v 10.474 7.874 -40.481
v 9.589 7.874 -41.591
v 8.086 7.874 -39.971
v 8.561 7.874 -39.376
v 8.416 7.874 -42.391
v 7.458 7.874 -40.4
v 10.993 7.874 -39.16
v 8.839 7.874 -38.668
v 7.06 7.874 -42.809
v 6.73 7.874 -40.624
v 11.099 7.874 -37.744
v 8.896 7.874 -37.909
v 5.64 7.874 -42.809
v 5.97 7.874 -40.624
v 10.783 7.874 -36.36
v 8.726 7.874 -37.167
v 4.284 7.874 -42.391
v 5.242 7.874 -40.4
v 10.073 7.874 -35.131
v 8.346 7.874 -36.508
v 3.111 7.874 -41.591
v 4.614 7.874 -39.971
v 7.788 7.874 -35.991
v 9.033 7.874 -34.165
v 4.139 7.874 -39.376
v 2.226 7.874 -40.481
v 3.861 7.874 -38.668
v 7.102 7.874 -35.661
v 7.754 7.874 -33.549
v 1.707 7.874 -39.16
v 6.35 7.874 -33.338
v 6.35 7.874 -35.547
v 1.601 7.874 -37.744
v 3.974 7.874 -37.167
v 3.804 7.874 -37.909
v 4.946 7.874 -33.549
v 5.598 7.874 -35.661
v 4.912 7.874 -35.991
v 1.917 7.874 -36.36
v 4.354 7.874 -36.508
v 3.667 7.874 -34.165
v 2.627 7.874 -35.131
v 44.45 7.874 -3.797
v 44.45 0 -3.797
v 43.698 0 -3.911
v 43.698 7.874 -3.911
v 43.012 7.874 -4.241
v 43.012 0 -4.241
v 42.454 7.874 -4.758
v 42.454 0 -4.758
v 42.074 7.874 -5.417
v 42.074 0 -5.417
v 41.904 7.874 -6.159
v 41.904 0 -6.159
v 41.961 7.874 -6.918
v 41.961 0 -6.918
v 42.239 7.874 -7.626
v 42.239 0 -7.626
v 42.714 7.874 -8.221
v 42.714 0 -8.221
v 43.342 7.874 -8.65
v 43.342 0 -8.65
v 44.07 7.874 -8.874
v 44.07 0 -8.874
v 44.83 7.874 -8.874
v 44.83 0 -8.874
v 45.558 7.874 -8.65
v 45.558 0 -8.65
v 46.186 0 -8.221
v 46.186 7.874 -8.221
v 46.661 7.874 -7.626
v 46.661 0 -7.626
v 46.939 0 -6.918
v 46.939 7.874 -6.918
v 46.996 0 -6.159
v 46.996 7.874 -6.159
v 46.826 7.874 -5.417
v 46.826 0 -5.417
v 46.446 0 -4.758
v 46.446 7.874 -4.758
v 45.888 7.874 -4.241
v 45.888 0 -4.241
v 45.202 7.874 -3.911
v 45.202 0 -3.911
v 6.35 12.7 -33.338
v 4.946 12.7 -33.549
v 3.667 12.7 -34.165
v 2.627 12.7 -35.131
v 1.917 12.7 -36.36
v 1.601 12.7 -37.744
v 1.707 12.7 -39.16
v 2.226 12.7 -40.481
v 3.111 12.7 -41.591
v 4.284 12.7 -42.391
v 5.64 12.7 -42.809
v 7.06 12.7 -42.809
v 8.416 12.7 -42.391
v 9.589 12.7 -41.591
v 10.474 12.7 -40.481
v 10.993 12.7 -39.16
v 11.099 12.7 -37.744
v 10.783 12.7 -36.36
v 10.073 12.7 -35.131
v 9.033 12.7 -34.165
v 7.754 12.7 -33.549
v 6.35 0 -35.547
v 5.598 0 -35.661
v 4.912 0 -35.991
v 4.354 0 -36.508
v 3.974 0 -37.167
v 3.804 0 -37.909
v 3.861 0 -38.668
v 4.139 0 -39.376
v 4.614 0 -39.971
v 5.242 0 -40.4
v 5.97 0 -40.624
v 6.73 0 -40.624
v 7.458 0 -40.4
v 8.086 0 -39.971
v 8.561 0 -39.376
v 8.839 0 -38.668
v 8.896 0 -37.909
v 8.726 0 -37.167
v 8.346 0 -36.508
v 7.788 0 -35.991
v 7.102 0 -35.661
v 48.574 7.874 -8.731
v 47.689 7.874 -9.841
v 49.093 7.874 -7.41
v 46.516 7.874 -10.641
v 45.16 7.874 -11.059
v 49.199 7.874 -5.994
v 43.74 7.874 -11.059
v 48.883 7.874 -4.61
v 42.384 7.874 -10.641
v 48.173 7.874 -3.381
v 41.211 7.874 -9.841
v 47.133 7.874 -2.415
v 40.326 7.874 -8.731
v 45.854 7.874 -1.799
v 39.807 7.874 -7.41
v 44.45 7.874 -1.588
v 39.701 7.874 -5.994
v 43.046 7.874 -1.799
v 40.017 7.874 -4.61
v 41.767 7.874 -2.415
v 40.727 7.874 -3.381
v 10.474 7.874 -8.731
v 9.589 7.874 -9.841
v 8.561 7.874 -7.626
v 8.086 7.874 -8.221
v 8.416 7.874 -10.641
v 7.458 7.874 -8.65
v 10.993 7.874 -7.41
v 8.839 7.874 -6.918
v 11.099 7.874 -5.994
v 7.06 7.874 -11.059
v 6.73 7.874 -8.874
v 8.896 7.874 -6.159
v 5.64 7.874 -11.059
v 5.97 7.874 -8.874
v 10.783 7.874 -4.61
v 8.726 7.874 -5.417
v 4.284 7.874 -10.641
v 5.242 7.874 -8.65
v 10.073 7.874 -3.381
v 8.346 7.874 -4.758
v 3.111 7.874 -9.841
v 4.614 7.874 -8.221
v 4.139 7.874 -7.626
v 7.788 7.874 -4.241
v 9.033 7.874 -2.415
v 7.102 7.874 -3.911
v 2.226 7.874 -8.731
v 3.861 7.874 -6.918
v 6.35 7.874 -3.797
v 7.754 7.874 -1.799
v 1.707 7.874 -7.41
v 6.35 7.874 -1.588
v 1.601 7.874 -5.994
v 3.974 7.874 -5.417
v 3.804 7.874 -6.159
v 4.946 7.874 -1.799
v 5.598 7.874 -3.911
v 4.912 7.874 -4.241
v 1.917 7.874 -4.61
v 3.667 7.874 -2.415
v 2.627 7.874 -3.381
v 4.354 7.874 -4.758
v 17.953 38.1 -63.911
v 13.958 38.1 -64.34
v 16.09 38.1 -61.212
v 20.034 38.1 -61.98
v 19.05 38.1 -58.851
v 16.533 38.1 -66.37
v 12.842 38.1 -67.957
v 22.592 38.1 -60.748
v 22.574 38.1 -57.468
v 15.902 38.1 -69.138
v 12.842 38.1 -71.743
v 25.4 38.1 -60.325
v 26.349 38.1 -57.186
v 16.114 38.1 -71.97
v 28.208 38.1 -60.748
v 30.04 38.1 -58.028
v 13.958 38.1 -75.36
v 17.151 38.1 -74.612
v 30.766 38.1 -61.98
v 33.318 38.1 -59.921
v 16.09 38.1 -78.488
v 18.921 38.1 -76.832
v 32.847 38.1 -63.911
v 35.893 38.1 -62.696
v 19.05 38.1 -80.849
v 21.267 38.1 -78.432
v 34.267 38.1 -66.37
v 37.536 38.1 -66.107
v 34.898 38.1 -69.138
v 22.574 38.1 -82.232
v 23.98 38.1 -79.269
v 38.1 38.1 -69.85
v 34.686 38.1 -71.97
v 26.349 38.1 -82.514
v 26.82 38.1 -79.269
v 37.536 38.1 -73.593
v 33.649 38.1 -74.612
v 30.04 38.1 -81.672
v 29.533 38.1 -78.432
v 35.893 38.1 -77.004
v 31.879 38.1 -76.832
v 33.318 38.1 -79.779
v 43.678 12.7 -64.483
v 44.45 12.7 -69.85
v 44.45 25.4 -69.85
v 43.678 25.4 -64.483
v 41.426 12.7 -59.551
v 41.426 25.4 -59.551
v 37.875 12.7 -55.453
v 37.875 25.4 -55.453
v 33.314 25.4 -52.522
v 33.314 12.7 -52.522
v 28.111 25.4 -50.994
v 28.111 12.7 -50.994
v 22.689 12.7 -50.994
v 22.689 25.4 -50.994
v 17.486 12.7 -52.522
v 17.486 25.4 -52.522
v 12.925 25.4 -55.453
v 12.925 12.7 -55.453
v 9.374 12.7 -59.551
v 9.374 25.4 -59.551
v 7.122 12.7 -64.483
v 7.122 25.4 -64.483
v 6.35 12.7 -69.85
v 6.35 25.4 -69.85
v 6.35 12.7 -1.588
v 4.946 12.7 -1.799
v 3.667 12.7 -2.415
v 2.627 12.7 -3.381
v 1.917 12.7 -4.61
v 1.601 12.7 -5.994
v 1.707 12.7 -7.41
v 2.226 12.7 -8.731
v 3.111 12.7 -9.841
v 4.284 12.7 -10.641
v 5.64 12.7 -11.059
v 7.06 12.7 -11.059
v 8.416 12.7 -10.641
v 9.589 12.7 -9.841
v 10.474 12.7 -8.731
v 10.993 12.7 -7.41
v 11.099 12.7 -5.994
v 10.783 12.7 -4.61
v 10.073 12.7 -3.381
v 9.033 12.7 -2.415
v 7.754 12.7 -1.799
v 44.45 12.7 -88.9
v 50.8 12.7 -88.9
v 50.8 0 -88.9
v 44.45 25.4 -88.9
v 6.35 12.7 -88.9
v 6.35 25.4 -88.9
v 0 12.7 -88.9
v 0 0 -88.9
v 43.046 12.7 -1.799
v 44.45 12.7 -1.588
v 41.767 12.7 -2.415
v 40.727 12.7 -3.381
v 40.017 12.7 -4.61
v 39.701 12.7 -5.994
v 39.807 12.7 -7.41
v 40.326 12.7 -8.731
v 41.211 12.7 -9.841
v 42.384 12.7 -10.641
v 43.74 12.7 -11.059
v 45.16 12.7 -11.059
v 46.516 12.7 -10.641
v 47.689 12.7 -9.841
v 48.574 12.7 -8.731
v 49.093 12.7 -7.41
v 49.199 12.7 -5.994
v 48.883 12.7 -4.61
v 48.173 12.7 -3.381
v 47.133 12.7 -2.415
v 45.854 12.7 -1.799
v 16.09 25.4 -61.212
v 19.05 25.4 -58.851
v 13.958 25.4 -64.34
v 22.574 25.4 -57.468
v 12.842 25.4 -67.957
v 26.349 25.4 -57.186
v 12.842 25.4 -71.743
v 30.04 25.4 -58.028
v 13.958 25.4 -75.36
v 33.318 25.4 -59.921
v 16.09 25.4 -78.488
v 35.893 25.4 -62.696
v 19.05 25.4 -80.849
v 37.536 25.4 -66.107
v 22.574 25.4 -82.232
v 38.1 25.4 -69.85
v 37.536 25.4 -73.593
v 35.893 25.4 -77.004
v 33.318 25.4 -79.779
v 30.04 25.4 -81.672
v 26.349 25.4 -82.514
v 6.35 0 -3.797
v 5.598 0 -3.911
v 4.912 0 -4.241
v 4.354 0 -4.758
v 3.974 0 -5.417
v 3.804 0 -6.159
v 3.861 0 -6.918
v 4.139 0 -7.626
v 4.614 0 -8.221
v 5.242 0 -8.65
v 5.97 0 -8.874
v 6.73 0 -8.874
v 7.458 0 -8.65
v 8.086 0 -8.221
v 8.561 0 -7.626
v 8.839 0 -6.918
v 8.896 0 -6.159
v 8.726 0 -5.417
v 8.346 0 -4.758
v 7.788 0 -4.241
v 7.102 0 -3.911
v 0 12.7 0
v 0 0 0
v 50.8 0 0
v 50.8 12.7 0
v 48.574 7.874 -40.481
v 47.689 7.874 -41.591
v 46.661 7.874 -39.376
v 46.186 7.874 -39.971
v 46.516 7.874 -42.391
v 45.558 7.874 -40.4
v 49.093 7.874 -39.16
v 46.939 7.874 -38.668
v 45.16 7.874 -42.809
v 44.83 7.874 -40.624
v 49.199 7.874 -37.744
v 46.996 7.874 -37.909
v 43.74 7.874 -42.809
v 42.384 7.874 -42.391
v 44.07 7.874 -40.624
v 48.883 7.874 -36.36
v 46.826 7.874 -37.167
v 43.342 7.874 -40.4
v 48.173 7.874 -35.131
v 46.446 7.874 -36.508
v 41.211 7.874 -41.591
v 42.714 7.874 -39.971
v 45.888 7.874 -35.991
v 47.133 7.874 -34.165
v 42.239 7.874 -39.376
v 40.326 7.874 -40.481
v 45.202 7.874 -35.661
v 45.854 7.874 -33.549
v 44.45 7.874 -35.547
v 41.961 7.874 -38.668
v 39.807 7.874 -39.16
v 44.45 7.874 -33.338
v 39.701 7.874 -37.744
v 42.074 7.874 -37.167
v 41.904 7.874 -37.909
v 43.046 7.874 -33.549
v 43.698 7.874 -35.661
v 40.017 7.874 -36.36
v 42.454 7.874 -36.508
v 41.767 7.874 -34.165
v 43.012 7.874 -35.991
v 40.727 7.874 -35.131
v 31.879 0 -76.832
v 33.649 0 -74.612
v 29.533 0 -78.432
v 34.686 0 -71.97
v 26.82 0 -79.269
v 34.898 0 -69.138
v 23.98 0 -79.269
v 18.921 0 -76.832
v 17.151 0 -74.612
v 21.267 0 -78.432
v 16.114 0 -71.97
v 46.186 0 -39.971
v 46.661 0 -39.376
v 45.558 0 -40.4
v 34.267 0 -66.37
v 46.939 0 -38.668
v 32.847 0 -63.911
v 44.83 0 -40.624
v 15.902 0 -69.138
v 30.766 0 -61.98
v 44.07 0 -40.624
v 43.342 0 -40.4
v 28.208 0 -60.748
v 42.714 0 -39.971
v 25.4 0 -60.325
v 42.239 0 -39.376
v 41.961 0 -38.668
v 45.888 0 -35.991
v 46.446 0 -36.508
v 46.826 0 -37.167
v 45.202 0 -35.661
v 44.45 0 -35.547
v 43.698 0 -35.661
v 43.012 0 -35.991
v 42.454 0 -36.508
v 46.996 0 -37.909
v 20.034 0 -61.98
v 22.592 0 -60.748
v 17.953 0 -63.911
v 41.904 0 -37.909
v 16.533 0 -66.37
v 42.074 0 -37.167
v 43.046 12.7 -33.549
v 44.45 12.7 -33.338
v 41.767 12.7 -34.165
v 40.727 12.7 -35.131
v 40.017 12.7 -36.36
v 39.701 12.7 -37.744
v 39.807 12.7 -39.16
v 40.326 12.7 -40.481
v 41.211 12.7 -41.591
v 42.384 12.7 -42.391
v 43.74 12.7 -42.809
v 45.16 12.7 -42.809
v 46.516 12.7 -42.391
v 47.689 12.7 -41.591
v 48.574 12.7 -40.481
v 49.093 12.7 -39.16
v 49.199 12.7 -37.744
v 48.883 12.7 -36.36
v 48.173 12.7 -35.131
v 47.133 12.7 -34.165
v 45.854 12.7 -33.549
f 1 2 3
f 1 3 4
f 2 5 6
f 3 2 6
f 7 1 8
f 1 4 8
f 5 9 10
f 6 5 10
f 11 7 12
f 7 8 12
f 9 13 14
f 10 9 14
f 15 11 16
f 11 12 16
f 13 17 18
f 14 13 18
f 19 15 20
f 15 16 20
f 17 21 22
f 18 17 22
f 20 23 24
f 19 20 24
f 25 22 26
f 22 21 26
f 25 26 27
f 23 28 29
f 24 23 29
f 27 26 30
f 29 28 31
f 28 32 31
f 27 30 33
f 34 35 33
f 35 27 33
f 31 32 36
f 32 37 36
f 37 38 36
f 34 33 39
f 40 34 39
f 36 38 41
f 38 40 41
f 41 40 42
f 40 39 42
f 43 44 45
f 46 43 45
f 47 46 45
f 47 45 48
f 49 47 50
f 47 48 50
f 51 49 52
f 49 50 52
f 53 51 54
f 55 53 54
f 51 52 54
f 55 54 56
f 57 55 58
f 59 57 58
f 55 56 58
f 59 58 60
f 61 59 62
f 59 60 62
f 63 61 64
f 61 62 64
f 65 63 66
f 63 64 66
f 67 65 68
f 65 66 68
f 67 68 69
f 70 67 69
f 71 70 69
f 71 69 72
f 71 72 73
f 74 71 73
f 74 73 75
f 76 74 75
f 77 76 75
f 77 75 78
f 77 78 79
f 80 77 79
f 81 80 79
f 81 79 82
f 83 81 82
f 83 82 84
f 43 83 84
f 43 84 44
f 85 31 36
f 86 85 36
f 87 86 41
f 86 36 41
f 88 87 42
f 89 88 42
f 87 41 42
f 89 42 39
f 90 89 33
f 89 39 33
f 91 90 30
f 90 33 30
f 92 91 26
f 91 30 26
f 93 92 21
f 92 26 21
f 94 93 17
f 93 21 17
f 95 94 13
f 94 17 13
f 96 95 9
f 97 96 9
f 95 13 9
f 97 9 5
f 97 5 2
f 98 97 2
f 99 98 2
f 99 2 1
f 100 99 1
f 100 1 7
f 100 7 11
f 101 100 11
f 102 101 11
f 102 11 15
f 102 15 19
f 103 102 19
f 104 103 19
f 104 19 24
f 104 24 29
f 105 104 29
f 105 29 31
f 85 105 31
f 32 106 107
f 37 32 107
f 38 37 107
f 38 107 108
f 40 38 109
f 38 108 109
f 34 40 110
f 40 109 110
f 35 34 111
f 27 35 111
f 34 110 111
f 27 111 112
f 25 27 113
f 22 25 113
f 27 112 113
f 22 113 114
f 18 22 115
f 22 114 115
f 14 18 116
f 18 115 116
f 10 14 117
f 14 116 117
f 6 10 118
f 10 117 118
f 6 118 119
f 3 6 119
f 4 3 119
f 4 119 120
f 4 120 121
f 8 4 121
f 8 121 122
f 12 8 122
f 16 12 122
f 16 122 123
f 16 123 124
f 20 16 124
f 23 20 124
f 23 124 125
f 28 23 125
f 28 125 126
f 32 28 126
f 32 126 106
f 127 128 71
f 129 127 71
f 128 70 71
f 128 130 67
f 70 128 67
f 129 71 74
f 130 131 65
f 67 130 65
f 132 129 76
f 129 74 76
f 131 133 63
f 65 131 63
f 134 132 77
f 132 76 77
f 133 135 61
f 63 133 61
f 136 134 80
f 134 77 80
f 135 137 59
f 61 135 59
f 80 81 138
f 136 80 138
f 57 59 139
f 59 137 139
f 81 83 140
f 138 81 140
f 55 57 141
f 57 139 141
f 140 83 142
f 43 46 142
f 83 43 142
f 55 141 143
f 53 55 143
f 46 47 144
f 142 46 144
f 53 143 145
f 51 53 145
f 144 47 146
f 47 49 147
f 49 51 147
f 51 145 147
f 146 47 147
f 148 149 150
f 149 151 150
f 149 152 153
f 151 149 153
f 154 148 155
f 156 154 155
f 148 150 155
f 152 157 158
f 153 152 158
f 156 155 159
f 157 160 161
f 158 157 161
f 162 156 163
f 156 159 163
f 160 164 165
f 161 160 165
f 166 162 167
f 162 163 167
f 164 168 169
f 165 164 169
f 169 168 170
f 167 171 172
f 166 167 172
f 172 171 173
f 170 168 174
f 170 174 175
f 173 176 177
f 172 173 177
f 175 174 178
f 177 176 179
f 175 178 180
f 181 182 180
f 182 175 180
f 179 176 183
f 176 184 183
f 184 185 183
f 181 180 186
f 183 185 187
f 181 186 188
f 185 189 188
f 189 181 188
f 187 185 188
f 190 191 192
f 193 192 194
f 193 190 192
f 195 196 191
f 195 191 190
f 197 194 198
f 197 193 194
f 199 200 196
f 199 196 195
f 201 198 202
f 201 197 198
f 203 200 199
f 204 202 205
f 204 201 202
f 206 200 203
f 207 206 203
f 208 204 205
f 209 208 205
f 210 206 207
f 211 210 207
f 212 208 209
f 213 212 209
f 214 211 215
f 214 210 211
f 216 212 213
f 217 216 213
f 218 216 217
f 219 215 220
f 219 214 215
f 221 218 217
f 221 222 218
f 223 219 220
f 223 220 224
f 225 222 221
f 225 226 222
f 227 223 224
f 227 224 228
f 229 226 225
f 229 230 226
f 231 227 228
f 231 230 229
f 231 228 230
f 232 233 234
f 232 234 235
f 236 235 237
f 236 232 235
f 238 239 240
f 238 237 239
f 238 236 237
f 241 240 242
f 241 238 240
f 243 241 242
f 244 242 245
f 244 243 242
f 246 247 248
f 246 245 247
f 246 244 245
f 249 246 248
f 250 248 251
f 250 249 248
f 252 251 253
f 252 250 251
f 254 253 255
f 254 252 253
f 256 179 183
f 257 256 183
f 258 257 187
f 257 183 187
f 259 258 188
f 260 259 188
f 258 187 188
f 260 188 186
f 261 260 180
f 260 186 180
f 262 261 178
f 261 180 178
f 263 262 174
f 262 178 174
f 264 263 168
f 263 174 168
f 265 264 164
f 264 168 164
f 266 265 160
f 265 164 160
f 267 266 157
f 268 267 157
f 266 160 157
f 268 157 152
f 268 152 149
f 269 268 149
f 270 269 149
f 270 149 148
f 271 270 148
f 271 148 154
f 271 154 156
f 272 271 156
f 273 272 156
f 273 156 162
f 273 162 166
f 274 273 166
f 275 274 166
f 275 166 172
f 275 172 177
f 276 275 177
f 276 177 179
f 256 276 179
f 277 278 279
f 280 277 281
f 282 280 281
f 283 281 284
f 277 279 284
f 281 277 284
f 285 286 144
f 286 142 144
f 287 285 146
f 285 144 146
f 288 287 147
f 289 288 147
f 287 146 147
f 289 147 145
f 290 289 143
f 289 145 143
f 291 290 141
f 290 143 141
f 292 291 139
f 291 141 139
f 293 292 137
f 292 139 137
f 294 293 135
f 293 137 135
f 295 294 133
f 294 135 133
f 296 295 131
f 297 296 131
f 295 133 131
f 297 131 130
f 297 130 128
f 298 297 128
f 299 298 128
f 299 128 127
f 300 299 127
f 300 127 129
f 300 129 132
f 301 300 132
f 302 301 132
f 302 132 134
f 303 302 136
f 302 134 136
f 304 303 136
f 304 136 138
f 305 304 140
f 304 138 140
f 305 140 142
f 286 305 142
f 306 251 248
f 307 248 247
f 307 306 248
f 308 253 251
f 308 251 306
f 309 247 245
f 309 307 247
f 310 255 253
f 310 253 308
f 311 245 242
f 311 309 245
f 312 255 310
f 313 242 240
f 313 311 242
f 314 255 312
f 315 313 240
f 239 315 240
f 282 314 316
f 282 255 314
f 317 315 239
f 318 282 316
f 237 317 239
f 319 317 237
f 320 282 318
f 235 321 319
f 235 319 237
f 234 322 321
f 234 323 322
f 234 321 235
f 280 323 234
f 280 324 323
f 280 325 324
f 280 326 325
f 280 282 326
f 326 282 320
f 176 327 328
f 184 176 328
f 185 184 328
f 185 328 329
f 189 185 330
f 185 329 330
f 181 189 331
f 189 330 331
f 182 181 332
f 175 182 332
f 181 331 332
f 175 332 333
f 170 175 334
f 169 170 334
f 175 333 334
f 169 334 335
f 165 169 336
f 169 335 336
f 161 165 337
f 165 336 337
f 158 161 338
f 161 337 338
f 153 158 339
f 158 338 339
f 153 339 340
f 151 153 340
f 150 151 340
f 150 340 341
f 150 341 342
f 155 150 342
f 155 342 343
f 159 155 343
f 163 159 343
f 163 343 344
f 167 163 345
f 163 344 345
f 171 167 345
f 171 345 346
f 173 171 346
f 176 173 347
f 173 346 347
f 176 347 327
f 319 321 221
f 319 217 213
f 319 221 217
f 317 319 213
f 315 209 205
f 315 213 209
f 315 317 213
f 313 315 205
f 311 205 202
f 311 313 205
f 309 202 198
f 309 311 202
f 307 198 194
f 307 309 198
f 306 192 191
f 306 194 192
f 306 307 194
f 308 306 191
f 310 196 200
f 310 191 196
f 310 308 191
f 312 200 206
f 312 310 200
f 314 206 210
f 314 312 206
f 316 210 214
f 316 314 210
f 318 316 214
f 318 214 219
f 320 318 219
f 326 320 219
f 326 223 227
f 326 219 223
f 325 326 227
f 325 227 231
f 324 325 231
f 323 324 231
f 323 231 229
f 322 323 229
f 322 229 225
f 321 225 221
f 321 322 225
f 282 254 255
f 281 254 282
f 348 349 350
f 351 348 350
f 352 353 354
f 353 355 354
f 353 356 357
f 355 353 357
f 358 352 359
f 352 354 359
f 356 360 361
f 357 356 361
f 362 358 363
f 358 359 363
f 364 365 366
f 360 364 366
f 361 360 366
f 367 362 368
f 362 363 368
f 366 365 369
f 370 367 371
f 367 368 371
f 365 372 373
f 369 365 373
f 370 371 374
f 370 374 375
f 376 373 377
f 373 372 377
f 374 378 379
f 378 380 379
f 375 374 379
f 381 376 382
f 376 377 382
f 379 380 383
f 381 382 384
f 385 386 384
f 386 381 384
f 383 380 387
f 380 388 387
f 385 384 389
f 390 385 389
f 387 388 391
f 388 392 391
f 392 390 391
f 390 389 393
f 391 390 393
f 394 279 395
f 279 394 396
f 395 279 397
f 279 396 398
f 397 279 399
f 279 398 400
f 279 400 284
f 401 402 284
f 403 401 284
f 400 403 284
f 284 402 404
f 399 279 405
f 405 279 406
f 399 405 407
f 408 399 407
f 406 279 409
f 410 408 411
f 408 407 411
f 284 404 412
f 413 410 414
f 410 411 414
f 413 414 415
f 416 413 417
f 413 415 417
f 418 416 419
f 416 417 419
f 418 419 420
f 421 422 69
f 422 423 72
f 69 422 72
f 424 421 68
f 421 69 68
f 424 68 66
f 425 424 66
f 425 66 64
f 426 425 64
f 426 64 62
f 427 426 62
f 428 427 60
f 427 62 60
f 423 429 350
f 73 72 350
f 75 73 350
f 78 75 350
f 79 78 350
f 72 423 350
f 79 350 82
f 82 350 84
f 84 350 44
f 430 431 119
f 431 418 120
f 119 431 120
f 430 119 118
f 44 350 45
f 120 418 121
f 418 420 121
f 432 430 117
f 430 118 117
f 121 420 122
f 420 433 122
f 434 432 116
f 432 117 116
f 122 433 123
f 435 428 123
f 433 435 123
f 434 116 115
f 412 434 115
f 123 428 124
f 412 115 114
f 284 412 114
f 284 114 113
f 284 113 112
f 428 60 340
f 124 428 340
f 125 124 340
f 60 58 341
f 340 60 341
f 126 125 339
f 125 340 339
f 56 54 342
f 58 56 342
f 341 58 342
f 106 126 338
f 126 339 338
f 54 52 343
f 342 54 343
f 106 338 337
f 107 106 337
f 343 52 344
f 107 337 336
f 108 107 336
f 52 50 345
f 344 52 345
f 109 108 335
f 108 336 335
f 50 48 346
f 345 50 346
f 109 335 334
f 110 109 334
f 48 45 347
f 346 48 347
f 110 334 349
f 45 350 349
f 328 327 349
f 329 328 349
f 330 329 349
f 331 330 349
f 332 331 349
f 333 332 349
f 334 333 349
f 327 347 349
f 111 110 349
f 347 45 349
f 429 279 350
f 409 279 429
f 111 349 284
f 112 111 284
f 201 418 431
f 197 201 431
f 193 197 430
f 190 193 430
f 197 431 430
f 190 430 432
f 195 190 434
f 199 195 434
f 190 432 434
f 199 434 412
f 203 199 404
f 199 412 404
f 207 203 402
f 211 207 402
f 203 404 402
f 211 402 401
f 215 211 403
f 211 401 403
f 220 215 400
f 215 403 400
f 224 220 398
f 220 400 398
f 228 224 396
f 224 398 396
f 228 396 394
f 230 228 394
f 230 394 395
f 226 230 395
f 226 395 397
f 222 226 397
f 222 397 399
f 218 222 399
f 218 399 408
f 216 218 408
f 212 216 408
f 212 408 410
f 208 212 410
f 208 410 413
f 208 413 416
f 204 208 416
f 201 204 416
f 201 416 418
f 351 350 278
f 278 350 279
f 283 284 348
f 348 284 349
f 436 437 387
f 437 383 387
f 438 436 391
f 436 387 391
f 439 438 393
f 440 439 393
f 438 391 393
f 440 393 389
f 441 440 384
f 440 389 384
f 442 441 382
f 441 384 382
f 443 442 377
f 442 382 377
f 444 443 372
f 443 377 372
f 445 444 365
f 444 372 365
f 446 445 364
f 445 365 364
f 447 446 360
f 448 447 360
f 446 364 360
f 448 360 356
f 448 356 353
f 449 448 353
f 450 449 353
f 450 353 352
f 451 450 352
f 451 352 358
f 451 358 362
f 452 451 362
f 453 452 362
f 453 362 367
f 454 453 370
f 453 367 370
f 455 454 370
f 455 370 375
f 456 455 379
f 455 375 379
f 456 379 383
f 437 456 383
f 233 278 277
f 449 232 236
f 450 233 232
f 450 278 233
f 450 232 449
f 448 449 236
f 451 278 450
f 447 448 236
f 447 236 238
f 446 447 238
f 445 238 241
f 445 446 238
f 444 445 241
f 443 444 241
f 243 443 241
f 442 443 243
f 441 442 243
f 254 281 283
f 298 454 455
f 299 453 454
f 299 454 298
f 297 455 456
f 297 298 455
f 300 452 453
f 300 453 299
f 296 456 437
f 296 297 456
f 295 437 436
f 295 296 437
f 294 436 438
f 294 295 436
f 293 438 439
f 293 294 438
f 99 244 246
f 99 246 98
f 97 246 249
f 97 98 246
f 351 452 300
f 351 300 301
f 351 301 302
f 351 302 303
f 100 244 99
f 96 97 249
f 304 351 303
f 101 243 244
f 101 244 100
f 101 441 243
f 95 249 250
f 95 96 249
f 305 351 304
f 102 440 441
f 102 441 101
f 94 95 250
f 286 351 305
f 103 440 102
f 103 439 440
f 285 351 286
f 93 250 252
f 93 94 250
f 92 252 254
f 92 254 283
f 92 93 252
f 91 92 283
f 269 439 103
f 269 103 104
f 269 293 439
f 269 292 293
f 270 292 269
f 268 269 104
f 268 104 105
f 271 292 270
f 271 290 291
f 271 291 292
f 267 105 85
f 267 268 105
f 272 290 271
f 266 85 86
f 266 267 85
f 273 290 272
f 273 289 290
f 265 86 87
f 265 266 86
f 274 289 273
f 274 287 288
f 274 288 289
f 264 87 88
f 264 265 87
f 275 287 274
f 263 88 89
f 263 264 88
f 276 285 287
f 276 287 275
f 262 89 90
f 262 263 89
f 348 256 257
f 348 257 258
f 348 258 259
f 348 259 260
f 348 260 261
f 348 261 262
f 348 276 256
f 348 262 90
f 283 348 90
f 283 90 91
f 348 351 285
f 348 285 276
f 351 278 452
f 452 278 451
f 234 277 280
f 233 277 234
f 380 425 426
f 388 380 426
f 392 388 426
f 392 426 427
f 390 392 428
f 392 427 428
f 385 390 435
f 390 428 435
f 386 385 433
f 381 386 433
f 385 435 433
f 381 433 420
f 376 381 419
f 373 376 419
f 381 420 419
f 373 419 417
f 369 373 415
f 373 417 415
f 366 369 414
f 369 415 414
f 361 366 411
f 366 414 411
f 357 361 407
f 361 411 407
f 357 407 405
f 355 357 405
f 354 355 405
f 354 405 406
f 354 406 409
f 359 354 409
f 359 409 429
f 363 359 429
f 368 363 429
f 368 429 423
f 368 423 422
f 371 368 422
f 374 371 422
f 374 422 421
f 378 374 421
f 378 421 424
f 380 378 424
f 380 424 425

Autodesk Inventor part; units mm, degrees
ref_plane "YZ Plane" through (0, 0, 0) normal (1, 0, 0) x (0, 1, 0)
ref_plane "XZ Plane" through (0, 0, 0) normal (0, 1, 0) x (-1, 0, 0)
ref_plane "XY Plane" through (0, 0, 0) normal (0, 0, 1) x (1, 0, 0)
sketch "Sketch1" plane through (0, 0, 0) normal (0, 1, 0) x (-1, 0, 0)
  line L0 (0, 0) -> (-50.8, 0)
  line L1 (-50.8, 0) -> (-50.8, -88.9)
  line L2 (-50.8, -88.9) -> (0, -88.9)
  line L3 (0, -88.9) -> (0, 0)
  dimension "d0" = 50.8
  dimension "d1" = 88.9
extrude "Extrusion1" add sketch "Sketch1" along normal blind 12.7
sketch "Sketch2" plane through (0, 12.7, 0) normal (0, 1, 0) x (1, 0, 0)
  line L0 (50.8, 0) -> (50.8, 88.9) projected
  line L1 (50.8, 88.9) -> (0, 88.9) projected
  line L2 (0, 88.9) -> (0, 0) projected
  line L3 (6.35, 88.9) -> (44.45, 88.9)
  line L4 (44.45, 88.9) -> (44.45, 69.85)
  line L5 (44.45, 69.85) -> (6.35, 69.85)
  line L6 (6.35, 69.85) -> (6.35, 88.9)
  line L7 (6.35, 79.375) -> (0, 79.375) construction
  line L8 (44.45, 79.375) -> (50.8, 79.375) construction
  circle A0 centre (25.4, 69.85) radius 19.05
  dimension "d4" = 19.05
  dimension "d5" = 6.35
extrude "Extrusion2" add sketch "Sketch2" along normal blind 12.7
sketch "Sketch3" plane through (0, 25.4, 0) normal (0, 1, 0) x (1, 0, 0)
  arc A0 (6.35, 69.85) -> (44.45, 69.85) centre (25.4, 69.85) ccw projected
  circle A1 centre (25.4, 69.85) radius 12.7
  point P0 (0, 0)
  dimension "d8" = 25.4
extrude "Extrusion3" add sketch "Sketch3" along normal blind 12.7
sketch "Sketch6" plane through (0, 12.7, 0) normal (0, 1, 0) x (1, 0, 0)
  line L0 (0, 88.9) -> (0, 0) projected
  line L1 (0, 0) -> (50.8, 0) projected
  line L2 (50.8, 0) -> (50.8, 88.9) projected
  line L3 (44.45, 88.9) -> (44.45, 6.35) construction
  line L4 (44.45, 6.35) -> (6.35, 6.35) construction
  line L5 (6.35, 6.35) -> (6.35, 88.9) construction
  line L6 (6.35, 38.1) -> (44.45, 38.1) construction
  dimension "d35" = 6.35
  dimension "d36" = 31.75
hole "Hole3" at (25.4, 38.1, -69.85) direction (0, -1, 0) diameter 19.05 end through all
hole "Hole4" at (6.35, 12.7, -6.35) at (6.35, 12.7, -38.1) at (44.45, 12.7, -6.35) at (44.45, 12.7, -38.1) direction (0, -1, 0) diameter 5.1054 end through all counterbore diameter 9.525 counterbore depth 4.826 clearance for "Socket Head Cap Screw" size "#10" standard "Ansi Unified Screw Threads"
properties part number "Holes"
